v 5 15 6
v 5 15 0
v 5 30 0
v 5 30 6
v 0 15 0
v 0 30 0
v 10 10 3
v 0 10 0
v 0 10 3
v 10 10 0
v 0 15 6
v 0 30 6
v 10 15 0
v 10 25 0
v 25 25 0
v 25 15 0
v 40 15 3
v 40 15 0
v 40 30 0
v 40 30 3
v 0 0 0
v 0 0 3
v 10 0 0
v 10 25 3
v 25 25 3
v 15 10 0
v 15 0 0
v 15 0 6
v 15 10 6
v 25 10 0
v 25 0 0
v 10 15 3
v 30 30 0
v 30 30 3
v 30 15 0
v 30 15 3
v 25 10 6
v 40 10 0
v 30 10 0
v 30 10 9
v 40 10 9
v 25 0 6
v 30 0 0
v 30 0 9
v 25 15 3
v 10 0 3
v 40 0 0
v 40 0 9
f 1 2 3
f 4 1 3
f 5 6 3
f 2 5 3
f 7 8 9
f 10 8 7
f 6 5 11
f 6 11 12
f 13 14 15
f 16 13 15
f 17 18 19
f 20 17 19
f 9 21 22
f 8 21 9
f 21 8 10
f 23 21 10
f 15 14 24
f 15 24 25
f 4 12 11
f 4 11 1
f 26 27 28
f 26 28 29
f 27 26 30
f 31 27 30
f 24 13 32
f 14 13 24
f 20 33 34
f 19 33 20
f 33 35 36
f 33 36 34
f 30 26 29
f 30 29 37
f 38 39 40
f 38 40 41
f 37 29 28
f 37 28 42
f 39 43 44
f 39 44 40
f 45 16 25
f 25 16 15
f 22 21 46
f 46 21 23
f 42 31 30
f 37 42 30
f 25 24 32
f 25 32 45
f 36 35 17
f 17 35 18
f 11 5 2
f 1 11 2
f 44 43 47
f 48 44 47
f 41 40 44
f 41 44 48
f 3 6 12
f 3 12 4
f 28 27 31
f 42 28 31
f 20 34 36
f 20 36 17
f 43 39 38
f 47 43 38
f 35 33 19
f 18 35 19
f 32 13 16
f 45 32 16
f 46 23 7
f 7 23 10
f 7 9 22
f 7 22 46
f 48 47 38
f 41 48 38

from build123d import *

# Parameters (mm, degrees)
BOX_W        = 10
BOX_H        = 10
BOX_DEPTH    = 3
BOX001_W     = 10
BOX001_H     = 10
BOX001_DEPTH = 6
BOX002_W     = 10
BOX002_H     = 10
BOX002_DEPTH = 9
BOX003_W     = 10
BOX003_H     = 15
BOX003_DEPTH = 3
BOX004_W     = 15
BOX004_H     = 10
BOX004_DEPTH = 3
BOX005_W     = 5
BOX005_H     = 15
BOX005_DEPTH = 6


with BuildPart() as cube:
    # Box → Box (new body)
    with BuildSketch(Plane.XY):
        with Locations((5, 5)):
            Rectangle(BOX_W, BOX_H)
    extrude(amount=BOX_DEPTH)


with BuildPart() as cube001:
    # Box001 → Box001 (new body)
    with BuildSketch(Plane(origin=(15, 0, 0), x_dir=(1, 0, 0), z_dir=(0, 0, 1))):
        with Locations((5, 5)):
            Rectangle(BOX001_W, BOX001_H)
    extrude(amount=BOX001_DEPTH)


with BuildPart() as cube002:
    # Box002 → Box002 (new body)
    with BuildSketch(Plane(origin=(30, 0, 0), x_dir=(1, 0, 0), z_dir=(0, 0, 1))):
        with Locations((5, 5)):
            Rectangle(BOX002_W, BOX002_H)
    extrude(amount=BOX002_DEPTH)


with BuildPart() as cube003:
    # Box003 → Box003 (new body)
    with BuildSketch(Plane(origin=(30, 15, 0), x_dir=(1, 0, 0), z_dir=(0, 0, 1))):
        with Locations((5, 7.5)):
            Rectangle(BOX003_W, BOX003_H)
    extrude(amount=BOX003_DEPTH)


with BuildPart() as cube004:
    # Box004 → Box004 (new body)
    with BuildSketch(Plane(origin=(10, 15, 0), x_dir=(1, 0, 0), z_dir=(0, 0, 1))):
        with Locations((7.5, 5)):
            Rectangle(BOX004_W, BOX004_H)
    extrude(amount=BOX004_DEPTH)


with BuildPart() as cube005:
    # Box005 → Box005 (new body)
    with BuildSketch(Plane(origin=(0, 15, 0), x_dir=(1, 0, 0), z_dir=(0, 0, 1))):
        with Locations((2.5, 7.5)):
            Rectangle(BOX005_W, BOX005_H)
    extrude(amount=BOX005_DEPTH)


solid = Compound([cube.part, cube001.part, cube002.part, cube003.part, cube004.part, cube005.part])
